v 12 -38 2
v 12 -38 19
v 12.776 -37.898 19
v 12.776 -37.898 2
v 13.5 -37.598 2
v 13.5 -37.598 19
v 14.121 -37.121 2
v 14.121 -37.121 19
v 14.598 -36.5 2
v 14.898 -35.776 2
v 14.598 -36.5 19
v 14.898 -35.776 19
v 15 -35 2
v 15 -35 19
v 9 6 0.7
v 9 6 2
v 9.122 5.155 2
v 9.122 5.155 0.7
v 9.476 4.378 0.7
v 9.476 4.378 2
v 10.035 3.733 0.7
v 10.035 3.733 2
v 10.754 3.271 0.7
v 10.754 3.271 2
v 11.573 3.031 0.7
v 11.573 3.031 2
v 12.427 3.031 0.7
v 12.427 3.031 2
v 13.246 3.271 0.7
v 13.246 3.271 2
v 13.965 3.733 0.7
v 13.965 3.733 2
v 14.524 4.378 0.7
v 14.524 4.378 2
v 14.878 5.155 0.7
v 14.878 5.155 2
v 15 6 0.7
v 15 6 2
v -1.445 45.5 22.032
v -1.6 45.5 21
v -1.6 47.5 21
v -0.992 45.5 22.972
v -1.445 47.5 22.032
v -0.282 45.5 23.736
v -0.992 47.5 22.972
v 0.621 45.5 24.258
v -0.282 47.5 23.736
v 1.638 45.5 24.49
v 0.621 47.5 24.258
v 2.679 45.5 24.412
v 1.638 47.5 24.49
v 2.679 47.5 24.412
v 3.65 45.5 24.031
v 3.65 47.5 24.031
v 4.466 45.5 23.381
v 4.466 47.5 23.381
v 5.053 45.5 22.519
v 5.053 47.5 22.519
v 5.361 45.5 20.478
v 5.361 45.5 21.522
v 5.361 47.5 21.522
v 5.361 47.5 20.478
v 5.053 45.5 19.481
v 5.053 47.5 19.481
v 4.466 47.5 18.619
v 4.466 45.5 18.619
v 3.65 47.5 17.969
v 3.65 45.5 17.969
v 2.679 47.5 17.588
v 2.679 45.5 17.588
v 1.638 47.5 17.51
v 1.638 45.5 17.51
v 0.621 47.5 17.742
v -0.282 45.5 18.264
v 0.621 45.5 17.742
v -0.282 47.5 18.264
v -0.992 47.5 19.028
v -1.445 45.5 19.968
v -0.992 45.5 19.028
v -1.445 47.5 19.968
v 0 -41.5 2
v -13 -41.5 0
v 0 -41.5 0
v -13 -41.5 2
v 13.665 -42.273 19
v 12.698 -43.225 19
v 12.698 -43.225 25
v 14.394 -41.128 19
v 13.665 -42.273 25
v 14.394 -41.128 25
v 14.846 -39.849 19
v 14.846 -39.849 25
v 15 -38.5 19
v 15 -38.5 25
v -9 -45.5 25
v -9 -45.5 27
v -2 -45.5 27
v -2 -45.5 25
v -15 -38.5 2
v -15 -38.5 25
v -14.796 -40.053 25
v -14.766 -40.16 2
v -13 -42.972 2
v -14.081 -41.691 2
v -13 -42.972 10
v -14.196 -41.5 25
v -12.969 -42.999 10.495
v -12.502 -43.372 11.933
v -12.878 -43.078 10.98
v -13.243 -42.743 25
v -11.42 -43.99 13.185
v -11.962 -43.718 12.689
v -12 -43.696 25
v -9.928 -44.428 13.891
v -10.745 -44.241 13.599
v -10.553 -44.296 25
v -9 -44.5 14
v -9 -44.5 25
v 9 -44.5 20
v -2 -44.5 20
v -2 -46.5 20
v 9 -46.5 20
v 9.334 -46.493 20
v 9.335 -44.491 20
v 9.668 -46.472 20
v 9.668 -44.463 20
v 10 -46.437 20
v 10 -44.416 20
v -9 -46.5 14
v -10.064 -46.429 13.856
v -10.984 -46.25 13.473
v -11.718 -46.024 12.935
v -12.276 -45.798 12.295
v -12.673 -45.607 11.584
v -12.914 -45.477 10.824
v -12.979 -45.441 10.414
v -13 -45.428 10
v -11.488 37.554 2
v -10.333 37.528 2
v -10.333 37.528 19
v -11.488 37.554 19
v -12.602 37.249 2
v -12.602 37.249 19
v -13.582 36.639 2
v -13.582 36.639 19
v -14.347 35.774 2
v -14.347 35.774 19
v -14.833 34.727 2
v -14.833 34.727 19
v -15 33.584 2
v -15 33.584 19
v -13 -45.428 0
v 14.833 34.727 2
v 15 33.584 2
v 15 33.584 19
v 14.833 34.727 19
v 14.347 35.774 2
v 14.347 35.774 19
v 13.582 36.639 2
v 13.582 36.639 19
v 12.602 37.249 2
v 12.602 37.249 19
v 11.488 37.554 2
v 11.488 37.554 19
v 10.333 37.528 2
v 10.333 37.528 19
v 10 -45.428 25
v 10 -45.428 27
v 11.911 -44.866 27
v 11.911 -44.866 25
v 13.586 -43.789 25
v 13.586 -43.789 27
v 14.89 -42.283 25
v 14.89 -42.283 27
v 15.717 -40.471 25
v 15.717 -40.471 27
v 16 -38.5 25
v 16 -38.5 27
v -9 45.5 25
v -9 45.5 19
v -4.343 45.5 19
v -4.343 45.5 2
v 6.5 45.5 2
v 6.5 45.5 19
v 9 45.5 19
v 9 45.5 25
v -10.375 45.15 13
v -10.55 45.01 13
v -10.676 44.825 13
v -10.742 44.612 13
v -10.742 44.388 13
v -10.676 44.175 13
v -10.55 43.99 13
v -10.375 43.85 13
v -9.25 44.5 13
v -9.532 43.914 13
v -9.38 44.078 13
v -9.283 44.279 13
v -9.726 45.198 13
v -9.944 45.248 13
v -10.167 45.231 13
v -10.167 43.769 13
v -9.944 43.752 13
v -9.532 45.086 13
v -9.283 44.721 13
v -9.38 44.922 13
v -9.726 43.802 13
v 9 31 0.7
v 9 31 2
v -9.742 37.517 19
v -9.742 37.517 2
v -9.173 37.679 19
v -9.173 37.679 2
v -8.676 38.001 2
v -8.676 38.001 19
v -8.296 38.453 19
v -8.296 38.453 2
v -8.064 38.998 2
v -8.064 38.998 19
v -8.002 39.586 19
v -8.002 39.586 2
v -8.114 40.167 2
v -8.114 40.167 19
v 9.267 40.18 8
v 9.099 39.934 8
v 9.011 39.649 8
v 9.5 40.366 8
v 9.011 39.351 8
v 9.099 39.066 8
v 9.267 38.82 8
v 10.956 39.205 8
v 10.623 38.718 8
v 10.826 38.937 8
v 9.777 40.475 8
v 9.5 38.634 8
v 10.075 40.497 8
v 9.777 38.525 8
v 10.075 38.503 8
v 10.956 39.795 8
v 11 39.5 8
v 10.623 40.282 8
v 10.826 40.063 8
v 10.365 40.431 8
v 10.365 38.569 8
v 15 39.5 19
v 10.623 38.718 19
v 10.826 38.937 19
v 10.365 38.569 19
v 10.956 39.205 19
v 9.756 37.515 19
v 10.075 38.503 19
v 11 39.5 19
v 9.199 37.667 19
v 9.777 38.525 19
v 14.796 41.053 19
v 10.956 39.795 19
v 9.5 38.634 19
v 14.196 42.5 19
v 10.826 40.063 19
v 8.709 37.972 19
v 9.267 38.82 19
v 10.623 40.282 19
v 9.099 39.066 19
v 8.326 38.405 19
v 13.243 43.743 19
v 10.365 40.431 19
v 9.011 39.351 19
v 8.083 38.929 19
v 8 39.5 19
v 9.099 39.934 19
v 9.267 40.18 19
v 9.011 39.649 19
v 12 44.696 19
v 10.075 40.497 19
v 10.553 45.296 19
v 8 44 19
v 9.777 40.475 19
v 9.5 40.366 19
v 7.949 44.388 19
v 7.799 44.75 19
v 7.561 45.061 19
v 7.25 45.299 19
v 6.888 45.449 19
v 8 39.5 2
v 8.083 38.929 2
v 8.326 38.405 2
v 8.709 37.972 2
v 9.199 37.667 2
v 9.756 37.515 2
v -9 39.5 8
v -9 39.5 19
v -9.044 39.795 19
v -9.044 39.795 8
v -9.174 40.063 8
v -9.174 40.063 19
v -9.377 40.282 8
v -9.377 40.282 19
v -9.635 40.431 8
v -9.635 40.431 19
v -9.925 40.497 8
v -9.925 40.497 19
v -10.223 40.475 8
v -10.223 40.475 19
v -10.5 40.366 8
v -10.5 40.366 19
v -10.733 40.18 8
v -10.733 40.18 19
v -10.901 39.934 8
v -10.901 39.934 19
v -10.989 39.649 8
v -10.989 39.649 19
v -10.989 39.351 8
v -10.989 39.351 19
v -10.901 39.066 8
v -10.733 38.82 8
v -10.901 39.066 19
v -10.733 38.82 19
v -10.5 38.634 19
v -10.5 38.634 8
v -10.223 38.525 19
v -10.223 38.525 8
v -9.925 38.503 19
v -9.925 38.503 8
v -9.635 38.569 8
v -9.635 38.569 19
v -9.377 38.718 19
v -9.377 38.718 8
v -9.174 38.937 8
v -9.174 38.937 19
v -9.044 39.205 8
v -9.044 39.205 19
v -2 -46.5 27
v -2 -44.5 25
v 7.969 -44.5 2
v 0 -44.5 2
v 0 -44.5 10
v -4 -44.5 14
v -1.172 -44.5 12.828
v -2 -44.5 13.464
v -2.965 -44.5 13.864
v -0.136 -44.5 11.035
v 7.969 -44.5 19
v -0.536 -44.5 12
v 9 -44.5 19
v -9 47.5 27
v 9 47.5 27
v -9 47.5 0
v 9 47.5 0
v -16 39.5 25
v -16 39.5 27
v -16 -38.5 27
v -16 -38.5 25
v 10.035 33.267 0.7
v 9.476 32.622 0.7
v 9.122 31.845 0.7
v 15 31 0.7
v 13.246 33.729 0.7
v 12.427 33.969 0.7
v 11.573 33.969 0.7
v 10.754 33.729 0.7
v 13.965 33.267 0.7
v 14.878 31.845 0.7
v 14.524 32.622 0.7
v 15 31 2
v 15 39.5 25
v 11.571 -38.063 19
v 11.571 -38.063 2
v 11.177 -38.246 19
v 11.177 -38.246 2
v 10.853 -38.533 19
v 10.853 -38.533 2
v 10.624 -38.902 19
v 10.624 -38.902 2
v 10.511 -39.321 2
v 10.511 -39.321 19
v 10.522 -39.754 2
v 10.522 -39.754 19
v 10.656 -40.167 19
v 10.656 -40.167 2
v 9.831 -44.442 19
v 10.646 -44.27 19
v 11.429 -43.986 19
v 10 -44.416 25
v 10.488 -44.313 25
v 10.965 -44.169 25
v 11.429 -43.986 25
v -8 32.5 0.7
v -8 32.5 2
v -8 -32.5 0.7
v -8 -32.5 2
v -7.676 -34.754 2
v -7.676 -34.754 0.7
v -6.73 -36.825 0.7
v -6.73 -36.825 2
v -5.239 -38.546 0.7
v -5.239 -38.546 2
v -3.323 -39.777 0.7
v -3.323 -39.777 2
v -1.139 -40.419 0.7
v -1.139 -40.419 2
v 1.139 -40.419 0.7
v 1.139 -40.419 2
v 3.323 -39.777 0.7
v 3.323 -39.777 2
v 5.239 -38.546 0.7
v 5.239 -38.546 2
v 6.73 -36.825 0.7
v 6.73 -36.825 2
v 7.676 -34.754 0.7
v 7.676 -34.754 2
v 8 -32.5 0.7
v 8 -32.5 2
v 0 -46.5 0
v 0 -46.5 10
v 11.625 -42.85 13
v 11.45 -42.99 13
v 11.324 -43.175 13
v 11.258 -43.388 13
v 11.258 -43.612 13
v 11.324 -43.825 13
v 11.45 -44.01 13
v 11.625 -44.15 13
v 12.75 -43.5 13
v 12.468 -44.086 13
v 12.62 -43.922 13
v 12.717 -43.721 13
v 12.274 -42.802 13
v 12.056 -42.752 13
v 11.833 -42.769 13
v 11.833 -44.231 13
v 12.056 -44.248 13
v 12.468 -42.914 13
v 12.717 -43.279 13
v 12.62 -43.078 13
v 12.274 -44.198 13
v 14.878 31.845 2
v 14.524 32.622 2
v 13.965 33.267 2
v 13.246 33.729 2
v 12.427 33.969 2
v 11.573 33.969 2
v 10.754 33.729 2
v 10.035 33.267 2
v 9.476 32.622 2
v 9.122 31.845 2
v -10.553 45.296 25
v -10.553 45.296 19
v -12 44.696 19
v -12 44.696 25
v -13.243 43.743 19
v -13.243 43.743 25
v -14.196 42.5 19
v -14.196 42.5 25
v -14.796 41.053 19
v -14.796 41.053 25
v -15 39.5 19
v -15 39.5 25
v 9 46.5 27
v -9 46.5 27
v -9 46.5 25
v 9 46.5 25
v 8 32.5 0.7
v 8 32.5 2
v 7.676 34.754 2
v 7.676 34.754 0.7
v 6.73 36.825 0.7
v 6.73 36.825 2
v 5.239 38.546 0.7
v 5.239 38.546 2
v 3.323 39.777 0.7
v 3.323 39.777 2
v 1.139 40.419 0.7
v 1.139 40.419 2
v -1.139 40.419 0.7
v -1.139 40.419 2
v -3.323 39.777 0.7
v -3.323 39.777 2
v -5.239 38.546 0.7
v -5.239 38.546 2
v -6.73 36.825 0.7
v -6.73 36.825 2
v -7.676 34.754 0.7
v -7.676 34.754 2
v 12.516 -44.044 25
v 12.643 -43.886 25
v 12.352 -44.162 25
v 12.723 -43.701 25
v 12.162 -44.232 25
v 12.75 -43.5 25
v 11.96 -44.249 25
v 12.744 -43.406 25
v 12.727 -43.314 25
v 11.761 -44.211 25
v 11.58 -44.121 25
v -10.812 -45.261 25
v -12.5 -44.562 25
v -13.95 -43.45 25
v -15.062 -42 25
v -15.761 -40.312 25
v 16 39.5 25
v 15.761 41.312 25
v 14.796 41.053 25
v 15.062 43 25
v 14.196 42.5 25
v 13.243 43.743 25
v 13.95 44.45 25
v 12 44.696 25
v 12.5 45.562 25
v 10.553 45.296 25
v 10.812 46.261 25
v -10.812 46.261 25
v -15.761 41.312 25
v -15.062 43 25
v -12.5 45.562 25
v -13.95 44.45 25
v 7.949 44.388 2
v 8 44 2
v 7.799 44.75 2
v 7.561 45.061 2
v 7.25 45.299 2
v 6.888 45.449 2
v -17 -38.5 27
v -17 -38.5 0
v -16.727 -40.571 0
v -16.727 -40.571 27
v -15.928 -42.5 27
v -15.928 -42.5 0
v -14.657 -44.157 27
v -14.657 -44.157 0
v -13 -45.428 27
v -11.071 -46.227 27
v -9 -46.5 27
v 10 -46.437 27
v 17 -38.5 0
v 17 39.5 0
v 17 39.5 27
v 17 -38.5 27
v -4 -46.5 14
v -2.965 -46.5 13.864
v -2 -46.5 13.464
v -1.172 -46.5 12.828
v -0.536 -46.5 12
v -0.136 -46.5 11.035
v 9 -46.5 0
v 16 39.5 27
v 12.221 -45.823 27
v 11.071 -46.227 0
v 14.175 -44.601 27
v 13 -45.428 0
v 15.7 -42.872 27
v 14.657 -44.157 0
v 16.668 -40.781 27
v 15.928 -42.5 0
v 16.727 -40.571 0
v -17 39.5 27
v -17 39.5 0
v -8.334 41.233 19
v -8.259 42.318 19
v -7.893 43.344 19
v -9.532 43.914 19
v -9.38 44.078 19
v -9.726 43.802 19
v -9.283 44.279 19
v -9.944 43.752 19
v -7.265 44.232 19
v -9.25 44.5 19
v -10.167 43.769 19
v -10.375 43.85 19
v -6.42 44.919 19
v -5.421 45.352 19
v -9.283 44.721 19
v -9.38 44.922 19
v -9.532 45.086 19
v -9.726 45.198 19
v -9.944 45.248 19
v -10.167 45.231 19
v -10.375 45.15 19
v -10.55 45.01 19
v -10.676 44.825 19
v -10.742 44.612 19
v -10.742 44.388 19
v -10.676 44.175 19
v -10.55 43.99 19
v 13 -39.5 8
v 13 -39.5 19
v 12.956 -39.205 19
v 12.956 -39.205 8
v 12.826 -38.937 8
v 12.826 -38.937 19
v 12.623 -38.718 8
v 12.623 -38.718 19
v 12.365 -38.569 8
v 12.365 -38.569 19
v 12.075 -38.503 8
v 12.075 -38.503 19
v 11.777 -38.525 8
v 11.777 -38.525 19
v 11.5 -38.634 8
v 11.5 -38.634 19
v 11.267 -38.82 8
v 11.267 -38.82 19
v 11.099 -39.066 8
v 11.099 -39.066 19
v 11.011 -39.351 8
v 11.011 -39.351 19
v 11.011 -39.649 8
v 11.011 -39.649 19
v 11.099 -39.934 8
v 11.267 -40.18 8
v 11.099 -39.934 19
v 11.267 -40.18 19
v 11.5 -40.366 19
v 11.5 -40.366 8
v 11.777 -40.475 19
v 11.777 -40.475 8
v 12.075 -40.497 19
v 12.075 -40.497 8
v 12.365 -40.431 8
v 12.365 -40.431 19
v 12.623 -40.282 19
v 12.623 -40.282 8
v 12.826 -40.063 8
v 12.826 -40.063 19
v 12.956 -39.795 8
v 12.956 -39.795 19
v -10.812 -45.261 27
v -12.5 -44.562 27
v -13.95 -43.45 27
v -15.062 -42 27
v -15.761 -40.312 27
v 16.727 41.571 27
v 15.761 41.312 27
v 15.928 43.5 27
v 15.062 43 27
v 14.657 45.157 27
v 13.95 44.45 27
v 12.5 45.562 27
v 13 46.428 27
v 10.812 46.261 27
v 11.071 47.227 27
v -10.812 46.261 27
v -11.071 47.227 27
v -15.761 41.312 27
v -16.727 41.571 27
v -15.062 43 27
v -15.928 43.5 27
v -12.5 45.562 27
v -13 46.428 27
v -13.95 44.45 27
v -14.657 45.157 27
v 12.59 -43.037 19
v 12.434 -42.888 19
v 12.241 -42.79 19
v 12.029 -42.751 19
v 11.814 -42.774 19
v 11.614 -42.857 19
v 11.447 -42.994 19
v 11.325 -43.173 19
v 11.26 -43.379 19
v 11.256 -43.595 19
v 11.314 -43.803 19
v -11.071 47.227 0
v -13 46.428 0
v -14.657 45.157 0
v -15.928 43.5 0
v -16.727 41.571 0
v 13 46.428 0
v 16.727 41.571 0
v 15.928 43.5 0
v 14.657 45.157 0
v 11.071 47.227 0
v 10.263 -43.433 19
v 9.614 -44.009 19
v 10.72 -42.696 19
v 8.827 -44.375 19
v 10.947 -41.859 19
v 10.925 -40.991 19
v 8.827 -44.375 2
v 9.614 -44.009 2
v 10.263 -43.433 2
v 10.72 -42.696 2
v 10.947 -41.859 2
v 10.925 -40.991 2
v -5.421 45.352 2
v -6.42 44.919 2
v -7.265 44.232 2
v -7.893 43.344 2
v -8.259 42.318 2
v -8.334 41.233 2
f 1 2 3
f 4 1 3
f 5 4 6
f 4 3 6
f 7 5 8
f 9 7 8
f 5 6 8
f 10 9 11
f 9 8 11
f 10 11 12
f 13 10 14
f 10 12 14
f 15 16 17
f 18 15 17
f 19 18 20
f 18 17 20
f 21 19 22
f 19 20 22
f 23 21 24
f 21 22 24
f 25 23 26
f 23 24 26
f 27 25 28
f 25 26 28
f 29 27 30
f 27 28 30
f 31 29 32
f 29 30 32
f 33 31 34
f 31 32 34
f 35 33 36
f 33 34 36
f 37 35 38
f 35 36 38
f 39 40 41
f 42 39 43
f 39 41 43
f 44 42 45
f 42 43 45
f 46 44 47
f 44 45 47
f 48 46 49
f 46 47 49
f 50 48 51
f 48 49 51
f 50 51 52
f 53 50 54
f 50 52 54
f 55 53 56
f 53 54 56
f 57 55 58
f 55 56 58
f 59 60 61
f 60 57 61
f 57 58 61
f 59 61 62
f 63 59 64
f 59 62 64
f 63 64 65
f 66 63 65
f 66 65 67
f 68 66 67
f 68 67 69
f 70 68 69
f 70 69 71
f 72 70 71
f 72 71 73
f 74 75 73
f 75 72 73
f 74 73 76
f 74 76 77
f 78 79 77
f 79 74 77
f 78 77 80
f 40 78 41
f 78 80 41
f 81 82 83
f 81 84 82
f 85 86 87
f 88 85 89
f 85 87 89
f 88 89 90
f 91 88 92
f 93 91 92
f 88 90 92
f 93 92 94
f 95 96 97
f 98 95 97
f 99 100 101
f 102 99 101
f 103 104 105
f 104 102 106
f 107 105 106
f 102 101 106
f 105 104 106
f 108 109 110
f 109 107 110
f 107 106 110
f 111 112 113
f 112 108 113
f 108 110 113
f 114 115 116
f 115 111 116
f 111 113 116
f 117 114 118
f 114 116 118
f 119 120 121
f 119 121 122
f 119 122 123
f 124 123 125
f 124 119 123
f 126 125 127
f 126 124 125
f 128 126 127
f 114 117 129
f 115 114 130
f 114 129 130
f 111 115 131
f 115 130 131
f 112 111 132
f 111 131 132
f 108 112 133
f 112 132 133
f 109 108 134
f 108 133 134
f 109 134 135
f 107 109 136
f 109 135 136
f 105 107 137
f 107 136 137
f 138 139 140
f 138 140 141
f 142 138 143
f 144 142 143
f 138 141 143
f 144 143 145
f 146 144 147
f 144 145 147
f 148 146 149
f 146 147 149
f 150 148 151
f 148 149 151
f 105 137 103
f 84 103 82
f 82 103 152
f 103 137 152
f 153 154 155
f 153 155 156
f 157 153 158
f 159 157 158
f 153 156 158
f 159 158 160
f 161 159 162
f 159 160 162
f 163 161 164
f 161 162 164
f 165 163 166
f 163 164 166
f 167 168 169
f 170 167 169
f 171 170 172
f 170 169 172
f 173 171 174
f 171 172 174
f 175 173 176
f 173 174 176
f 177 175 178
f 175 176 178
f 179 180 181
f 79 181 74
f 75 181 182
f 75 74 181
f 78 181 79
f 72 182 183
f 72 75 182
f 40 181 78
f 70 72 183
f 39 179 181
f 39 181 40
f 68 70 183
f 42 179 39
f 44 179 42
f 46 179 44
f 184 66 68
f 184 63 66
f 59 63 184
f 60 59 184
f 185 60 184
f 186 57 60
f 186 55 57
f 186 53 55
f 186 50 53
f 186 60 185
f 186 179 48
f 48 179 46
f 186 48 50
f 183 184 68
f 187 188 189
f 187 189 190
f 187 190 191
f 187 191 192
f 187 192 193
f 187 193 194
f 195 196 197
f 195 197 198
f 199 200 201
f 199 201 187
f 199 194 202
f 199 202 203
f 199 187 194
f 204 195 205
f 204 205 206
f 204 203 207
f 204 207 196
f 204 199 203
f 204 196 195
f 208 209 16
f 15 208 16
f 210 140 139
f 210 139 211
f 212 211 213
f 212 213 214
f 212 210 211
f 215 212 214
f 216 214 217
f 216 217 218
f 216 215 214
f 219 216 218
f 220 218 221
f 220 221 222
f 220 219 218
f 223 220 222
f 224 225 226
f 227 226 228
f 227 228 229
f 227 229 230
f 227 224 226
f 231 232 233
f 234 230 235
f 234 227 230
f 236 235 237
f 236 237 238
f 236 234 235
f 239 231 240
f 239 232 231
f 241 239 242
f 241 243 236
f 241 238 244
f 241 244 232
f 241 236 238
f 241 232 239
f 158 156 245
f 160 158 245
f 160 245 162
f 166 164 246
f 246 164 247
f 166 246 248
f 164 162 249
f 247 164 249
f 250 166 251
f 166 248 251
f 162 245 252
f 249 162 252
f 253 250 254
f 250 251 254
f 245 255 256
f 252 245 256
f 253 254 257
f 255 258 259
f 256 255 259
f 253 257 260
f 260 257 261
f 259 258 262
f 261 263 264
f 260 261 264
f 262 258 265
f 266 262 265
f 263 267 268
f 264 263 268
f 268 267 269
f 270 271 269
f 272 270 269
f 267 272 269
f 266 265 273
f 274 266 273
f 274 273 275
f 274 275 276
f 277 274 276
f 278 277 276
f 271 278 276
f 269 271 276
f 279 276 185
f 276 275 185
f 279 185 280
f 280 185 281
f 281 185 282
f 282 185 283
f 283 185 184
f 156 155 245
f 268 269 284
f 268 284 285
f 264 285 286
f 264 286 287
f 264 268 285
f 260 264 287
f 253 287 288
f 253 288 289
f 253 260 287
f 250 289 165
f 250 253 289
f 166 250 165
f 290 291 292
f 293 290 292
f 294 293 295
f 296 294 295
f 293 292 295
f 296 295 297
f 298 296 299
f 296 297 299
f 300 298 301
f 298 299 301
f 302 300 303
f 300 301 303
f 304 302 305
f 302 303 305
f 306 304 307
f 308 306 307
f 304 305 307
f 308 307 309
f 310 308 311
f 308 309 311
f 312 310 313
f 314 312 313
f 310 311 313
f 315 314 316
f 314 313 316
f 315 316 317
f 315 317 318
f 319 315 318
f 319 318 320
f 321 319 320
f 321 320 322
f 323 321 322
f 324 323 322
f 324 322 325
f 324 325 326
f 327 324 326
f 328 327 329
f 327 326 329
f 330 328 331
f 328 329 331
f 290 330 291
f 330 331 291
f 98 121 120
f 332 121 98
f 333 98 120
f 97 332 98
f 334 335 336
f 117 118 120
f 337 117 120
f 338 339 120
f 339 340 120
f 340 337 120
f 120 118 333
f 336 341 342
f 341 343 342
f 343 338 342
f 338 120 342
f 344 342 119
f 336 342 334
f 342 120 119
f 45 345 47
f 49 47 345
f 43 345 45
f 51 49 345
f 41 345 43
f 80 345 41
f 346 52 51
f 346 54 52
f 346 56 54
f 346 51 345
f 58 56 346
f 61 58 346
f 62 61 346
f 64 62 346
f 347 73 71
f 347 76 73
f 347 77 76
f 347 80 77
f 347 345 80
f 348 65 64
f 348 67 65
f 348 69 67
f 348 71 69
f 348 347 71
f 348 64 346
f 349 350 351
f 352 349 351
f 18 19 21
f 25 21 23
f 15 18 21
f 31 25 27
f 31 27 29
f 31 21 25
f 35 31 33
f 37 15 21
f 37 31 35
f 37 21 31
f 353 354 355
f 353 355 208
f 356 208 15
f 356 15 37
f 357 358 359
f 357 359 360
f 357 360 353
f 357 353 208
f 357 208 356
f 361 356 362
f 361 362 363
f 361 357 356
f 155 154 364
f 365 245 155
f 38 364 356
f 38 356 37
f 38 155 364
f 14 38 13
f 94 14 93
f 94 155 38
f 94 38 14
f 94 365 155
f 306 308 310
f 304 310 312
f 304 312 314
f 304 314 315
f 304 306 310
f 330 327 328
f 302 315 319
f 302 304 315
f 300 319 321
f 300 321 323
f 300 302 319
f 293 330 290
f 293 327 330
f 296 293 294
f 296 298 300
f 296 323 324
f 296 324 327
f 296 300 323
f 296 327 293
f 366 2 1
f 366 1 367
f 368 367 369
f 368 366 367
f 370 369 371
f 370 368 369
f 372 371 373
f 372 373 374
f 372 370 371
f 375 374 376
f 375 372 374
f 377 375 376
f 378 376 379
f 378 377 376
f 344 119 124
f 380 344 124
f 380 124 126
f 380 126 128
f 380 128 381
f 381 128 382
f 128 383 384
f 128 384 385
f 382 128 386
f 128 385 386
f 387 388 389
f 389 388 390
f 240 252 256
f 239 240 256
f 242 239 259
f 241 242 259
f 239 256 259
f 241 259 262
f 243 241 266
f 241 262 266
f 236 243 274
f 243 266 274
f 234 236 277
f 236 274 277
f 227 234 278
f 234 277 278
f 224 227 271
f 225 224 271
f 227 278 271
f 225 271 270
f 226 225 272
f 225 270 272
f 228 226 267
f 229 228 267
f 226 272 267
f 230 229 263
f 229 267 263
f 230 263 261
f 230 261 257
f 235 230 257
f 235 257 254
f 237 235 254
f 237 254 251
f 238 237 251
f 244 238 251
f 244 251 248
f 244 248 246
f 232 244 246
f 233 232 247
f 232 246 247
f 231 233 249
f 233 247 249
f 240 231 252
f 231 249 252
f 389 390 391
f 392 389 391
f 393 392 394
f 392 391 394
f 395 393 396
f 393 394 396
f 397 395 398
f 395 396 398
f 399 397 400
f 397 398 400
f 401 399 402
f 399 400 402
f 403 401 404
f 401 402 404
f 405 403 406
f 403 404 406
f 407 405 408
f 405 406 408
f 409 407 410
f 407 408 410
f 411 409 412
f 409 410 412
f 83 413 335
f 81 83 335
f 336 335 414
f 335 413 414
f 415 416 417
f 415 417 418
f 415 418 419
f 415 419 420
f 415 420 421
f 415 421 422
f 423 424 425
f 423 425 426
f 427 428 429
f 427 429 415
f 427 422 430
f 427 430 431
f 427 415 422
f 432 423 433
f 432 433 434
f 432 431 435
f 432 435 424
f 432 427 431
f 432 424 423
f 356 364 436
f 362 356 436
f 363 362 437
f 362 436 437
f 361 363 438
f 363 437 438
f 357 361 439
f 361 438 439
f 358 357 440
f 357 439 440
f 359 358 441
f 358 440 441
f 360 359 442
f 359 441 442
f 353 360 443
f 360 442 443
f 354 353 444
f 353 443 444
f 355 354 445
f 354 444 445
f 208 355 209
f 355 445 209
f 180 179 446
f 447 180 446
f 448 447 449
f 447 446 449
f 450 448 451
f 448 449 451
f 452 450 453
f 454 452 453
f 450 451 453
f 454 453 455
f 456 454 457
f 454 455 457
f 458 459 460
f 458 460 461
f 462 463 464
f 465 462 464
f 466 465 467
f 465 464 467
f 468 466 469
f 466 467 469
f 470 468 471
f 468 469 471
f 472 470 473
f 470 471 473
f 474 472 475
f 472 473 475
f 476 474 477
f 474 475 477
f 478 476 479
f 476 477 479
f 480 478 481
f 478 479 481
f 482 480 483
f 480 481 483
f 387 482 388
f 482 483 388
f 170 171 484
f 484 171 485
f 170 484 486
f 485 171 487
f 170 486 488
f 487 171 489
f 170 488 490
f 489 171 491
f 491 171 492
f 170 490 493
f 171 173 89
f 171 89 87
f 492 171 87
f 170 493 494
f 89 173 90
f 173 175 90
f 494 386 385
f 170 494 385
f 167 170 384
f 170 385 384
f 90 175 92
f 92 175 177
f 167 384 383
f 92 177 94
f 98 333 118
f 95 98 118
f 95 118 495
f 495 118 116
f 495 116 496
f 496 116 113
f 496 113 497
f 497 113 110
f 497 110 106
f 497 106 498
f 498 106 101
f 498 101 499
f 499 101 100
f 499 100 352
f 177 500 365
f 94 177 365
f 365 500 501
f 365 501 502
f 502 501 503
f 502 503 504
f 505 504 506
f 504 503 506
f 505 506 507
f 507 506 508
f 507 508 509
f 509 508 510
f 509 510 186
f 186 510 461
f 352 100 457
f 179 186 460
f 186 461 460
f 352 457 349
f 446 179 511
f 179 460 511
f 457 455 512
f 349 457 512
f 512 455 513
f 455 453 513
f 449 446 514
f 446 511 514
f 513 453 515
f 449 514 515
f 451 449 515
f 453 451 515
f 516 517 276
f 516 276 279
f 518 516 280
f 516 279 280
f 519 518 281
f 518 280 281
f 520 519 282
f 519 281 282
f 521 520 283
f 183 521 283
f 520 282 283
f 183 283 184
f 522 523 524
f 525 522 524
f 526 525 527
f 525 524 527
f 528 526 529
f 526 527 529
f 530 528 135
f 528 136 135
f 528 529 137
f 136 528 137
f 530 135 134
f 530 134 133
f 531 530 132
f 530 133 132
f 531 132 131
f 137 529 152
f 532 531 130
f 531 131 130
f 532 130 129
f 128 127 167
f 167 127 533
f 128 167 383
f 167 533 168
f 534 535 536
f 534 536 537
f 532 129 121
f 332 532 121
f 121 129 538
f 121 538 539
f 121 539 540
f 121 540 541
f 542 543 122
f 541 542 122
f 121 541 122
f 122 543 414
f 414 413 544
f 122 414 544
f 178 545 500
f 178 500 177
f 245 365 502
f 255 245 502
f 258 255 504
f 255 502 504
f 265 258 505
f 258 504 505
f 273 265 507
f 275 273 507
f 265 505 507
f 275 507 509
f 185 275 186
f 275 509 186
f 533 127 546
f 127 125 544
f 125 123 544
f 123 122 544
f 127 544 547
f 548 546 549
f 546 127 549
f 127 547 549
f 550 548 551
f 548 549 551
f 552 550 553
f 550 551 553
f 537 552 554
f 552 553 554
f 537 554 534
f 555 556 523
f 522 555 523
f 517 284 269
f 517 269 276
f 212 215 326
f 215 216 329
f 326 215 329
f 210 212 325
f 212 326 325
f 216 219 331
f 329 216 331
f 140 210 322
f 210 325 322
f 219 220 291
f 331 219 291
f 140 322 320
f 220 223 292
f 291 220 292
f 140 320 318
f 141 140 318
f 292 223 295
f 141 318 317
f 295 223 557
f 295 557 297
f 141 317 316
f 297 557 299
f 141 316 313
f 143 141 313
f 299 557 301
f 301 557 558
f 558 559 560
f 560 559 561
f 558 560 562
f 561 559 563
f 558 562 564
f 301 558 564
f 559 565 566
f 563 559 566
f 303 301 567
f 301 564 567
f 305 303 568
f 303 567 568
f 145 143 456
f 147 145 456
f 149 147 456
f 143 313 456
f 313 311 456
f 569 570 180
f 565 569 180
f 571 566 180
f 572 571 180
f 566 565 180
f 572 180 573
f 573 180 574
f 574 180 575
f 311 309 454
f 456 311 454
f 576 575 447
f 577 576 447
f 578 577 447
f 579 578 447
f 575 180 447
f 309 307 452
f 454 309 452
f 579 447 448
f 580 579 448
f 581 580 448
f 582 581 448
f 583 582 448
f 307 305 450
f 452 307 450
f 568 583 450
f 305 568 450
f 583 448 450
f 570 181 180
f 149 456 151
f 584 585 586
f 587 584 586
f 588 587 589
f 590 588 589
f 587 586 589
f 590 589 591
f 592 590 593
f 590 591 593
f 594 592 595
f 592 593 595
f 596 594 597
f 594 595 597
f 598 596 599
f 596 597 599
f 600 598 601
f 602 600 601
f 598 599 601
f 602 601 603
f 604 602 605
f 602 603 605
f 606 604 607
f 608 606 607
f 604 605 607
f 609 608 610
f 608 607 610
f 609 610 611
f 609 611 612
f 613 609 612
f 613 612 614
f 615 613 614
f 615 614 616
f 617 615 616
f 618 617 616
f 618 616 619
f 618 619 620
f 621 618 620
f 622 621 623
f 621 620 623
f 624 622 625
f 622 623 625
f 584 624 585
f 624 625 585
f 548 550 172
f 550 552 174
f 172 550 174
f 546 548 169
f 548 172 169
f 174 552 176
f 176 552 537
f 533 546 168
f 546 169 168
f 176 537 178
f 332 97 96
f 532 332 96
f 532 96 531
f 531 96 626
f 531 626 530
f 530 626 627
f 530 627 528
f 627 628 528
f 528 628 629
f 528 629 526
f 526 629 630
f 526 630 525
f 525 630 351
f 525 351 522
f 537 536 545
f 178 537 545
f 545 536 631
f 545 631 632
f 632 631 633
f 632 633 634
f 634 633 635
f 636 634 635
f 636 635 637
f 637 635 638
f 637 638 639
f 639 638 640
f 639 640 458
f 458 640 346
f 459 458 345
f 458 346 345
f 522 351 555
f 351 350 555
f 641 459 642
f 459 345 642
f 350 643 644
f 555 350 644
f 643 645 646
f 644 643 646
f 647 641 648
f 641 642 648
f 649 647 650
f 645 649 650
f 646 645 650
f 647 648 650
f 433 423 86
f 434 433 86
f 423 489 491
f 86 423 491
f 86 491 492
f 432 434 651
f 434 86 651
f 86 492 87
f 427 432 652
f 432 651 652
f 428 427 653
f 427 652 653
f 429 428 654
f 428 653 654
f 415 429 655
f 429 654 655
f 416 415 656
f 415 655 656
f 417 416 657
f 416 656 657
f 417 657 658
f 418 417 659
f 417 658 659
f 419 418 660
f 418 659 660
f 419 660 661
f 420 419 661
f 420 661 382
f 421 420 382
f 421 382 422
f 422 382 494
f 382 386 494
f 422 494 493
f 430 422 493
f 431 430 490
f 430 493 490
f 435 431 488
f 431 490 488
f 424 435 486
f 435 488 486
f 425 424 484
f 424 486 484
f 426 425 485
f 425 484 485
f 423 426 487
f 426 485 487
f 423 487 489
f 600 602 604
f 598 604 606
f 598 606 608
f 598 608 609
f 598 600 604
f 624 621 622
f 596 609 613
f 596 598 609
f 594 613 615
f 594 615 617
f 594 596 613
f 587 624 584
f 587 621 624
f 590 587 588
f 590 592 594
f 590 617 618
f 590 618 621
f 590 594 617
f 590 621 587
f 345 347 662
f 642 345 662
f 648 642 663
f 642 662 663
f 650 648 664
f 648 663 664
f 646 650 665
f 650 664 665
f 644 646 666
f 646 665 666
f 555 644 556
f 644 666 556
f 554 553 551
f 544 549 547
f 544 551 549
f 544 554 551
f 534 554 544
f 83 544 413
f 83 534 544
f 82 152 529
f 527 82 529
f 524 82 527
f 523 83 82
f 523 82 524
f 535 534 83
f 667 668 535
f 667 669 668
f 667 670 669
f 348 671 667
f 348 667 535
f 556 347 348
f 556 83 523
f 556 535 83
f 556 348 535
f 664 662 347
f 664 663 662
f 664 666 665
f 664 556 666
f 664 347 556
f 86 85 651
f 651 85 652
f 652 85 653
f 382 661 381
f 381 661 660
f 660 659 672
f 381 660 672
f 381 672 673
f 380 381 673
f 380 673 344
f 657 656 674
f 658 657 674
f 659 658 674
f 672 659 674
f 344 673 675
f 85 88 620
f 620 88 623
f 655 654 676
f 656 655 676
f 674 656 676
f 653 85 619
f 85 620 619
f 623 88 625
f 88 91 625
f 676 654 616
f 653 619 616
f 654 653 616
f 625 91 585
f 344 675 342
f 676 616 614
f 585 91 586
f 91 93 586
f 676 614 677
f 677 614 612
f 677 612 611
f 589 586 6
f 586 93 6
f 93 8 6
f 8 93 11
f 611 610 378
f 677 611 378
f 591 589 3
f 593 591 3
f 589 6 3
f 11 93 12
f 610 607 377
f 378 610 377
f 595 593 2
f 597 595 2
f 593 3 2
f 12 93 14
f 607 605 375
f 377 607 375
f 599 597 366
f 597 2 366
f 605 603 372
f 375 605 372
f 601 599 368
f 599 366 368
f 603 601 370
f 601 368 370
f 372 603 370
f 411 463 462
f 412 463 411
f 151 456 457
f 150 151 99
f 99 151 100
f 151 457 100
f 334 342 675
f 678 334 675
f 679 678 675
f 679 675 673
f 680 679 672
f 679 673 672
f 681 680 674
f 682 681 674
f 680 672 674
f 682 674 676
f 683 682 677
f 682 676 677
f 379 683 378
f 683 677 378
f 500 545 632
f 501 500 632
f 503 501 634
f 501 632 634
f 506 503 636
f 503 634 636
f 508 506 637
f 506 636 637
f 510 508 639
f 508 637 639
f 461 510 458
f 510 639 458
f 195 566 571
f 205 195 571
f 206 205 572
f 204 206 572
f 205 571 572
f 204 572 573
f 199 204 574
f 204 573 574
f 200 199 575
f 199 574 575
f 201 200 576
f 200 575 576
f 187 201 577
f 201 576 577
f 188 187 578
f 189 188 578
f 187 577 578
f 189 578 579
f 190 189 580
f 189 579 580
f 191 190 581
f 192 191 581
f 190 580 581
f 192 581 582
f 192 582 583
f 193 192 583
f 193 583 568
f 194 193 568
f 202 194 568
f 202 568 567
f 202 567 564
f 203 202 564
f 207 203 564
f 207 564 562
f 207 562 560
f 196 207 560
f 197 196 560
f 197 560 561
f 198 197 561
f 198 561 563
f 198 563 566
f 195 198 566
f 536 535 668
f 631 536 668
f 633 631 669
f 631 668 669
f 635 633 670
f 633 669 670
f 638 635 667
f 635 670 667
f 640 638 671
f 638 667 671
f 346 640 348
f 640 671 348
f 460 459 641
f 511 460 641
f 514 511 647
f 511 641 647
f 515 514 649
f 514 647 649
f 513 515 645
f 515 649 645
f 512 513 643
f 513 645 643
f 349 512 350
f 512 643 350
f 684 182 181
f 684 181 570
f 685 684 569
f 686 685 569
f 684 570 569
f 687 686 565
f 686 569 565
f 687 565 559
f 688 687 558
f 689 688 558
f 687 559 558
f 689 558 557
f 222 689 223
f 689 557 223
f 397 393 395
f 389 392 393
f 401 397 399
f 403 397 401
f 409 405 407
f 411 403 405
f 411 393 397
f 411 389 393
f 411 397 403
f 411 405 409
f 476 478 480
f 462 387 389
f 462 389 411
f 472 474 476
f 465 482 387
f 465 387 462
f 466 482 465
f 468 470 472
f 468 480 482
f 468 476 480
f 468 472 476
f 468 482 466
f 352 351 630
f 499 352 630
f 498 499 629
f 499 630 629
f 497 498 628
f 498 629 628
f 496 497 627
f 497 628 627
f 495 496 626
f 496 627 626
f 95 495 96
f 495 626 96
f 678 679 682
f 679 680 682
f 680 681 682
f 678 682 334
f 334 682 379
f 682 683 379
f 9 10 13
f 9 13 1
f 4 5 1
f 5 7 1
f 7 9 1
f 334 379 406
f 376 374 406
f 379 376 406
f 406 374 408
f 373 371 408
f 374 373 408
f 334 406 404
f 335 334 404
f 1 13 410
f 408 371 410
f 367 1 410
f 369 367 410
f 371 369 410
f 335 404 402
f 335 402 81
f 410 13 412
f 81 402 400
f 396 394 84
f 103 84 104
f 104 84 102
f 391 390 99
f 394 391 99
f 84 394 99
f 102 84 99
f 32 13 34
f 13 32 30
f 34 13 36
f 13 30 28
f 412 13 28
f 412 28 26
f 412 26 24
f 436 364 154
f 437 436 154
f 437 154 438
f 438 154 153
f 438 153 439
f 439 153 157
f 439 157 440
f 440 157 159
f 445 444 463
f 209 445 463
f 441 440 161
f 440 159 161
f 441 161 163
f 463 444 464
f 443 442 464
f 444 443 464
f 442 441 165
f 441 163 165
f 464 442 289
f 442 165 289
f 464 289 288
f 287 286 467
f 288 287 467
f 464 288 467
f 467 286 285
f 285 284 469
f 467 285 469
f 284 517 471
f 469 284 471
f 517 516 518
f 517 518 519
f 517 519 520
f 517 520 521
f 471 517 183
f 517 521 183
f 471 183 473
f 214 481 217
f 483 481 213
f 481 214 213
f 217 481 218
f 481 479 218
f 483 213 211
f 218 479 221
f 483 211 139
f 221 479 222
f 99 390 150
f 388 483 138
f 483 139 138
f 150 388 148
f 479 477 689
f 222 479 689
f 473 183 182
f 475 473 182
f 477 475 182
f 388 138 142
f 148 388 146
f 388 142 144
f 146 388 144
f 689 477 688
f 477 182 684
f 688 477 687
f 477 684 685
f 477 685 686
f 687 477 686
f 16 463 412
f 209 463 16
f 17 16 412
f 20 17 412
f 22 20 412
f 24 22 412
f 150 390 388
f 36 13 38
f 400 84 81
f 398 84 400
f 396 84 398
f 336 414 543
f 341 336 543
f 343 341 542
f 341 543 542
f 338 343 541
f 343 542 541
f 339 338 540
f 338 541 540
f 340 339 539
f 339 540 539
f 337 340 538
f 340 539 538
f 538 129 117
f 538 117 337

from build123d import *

# Parameters (mm, degrees)
PAD_DEPTH       = 27
POCKET_DEPTH    = 8
SKETCH002_R     = 3.5
POCKET001_DEPTH = 5
POCKET002_DEPTH = 17
SKETCH004_R     = 1
POCKET003_DEPTH = 11
SKETCH005_W     = 12
SKETCH005_H     = 4
POCKET004_DEPTH = 7
POCKET005_DEPTH = 1.3
POCKET006_DEPTH = 2
SKETCH011_R     = 0.75
POCKET008_DEPTH = 12
POCKET009_DEPTH = 5


with BuildPart() as part:
    # Sketch → Pad (new body)
    with BuildSketch(Plane.XY):
        with BuildLine():
            Line((-9, 47.5), (9, 47.5))
            ThreePointArc((17, 39.5), (14.656854, 45.156854), (9, 47.5))
            Line((17, 39.5), (17, -38.5))
            ThreePointArc((9, -46.5), (14.656854, -44.156854), (17, -38.5))
            Line((-9, -46.5), (9, -46.5))
            ThreePointArc((-17, -38.5), (-14.656854, -44.156854), (-9, -46.5))
            Line((-17, 39.5), (-17, -38.5))
            ThreePointArc((-9, 47.5), (-14.656854, 45.156854), (-17, 39.5))
        make_face()
    extrude(amount=PAD_DEPTH)

    # Sketch001 (on Face10 of Pad) → Pocket (cut)
    with BuildSketch(Plane.XY.offset(27)):
        with BuildLine():
            Line((-9, 45.5), (9, 45.5))
            ThreePointArc((15, 39.5), (13.242641, 43.742641), (9, 45.5))
            Line((15, 39.5), (15, -38.5))
            ThreePointArc((9, -44.5), (13.242641, -42.742641), (15, -38.5))
            Line((-9, -44.5), (9, -44.5))
            ThreePointArc((-15, -38.5), (-13.242641, -42.742641), (-9, -44.5))
            Line((-15, 39.5), (-15, -38.5))
            ThreePointArc((-9, 45.5), (-13.242641, 43.742641), (-15, 39.5))
        make_face()
    extrude(amount=-POCKET_DEPTH, mode=Mode.SUBTRACT)

    # Sketch002 (on Face2 of Pocket) → Pocket001 (cut)
    with BuildSketch(Plane(origin=(0, 47.5, 0), x_dir=(-1, 0, 0), z_dir=(0, 1, 0))):
        with Locations((-1.9, 21)):
            Circle(SKETCH002_R)
    extrude(amount=-POCKET001_DEPTH, mode=Mode.SUBTRACT)

    # Sketch003 (on Face20 of Pocket001) → Pocket002 (cut)
    with BuildSketch(Plane.XY.offset(19)):
        with BuildLine():
            ThreePointArc((8, 39.5), (8.709006, 37.972475), (10.333333, 37.527973))
            ThreePointArc((15, 33.58392), (13.581989, 36.638971), (10.333333, 37.527973))
            Line((15, -35), (15, 33.58392))
            ThreePointArc((12, -38), (14.12132, -37.12132), (15, -35))
            ThreePointArc((12, -38), (10.725245, -38.709431), (10.65629, -40.166667))
            ThreePointArc((7.968871, -44.5), (10.518381, -43.081139), (10.65629, -40.166667))
            Line((7.968871, -44.5), (-9, -44.5))
            ThreePointArc((-15, -38.5), (-13.242641, -42.742641), (-9, -44.5))
            Line((-15, -38.5), (-15, 33.58392))
            ThreePointArc((-10.333333, 37.527973), (-13.581989, 36.638971), (-15, 33.58392))
            ThreePointArc((-10.333333, 37.527973), (-8.46929, 38.212783), (-8.114382, 40.166667))
            ThreePointArc((-4.343146, 45.5), (-7.609132, 43.809401), (-8.114382, 40.166667))
            Line((6.5, 45.5), (-4.343146, 45.5))
            ThreePointArc((8, 44), (7.56066, 45.06066), (6.5, 45.5))
            Line((8, 39.5), (8, 44))
        make_face()
    extrude(amount=-POCKET002_DEPTH, mode=Mode.SUBTRACT)

    # Sketch004 (on Face15 of Pocket002) → Pocket003 (cut)
    with BuildSketch(Plane.XY.offset(19)):
        with Locations((-10, 39.5)):
            Circle(SKETCH004_R)
        with Locations((10, 39.5)):
            Circle(SKETCH004_R)
        with Locations((12, -39.5)):
            Circle(SKETCH004_R)
    extrude(amount=-POCKET003_DEPTH, mode=Mode.SUBTRACT)

    # Sketch005 (on Face5 of Pocket003) → Pocket004 (cut)
    with BuildSketch(Plane.XY.offset(27)):
        with Locations((4, -44.5)):
            Rectangle(SKETCH005_W, SKETCH005_H)
    extrude(amount=-POCKET004_DEPTH, mode=Mode.SUBTRACT)

    # Sketch007 (on Face26 of Pocket004) → Pocket005 (cut)
    with BuildSketch(Plane.XY.offset(2)):
        with BuildLine():
            ThreePointArc((8, 32.5), (0, 40.5), (-8, 32.5))
            Line((-8, 32.5), (-8, -32.5))
            ThreePointArc((-8, -32.5), (0, -40.5), (8, -32.5))
            Line((8, 32.5), (8, -32.5))
        make_face()
        with BuildLine():
            ThreePointArc((15, 31), (12, 34), (9, 31))
            Line((9, 31), (9, 6))
            ThreePointArc((9, 6), (12, 3), (15, 6))
            Line((15, 31), (15, 6))
        make_face()
    extrude(amount=-POCKET005_DEPTH, mode=Mode.SUBTRACT)

    # Sketch008 (on Face5 of Pocket005) → Pocket006 (cut)
    with BuildSketch(Plane.XY.offset(27)):
        with BuildLine():
            Line((-9, 46.5), (9, 46.5))
            ThreePointArc((16, 39.5), (13.949747, 44.449747), (9, 46.5))
            Line((16, 39.5), (16, -38.5))
            ThreePointArc((9, -45.5), (13.949747, -43.449747), (16, -38.5))
            Line((-9, -45.5), (9, -45.5))
            ThreePointArc((-16, -38.5), (-13.949747, -43.449747), (-9, -45.5))
            Line((-16, 39.5), (-16, -38.5))
            ThreePointArc((-9, 46.5), (-13.949747, 44.449747), (-16, 39.5))
        make_face()
    extrude(amount=-POCKET006_DEPTH, mode=Mode.SUBTRACT)

    # Sketch011 (on Face24 of Pocket006) → Pocket008 (cut)
    with BuildSketch(Plane.XY.offset(25)):
        with Locations((-10, 44.5)):
            Circle(SKETCH011_R)
        with Locations((12, -43.5)):
            Circle(SKETCH011_R)
    extrude(amount=-POCKET008_DEPTH, mode=Mode.SUBTRACT)

    # Sketch012 (on Face11 of Pocket008) → Pocket009 (cut)
    with BuildSketch(Plane.XZ.offset(46.5)):
        with BuildLine():
            Line((0, 0), (0, 10))
            ThreePointArc((0, 10), (-1.171573, 12.828427), (-4, 14))
            Line((-9, 14), (-4, 14))
            ThreePointArc((-9, 14), (-11.828427, 12.828427), (-13, 10))
            Line((-13, 10), (-13, 0))
            Line((-13, 0), (0, 0))
        make_face()
    extrude(amount=-POCKET009_DEPTH, mode=Mode.SUBTRACT)


solid = part.part
